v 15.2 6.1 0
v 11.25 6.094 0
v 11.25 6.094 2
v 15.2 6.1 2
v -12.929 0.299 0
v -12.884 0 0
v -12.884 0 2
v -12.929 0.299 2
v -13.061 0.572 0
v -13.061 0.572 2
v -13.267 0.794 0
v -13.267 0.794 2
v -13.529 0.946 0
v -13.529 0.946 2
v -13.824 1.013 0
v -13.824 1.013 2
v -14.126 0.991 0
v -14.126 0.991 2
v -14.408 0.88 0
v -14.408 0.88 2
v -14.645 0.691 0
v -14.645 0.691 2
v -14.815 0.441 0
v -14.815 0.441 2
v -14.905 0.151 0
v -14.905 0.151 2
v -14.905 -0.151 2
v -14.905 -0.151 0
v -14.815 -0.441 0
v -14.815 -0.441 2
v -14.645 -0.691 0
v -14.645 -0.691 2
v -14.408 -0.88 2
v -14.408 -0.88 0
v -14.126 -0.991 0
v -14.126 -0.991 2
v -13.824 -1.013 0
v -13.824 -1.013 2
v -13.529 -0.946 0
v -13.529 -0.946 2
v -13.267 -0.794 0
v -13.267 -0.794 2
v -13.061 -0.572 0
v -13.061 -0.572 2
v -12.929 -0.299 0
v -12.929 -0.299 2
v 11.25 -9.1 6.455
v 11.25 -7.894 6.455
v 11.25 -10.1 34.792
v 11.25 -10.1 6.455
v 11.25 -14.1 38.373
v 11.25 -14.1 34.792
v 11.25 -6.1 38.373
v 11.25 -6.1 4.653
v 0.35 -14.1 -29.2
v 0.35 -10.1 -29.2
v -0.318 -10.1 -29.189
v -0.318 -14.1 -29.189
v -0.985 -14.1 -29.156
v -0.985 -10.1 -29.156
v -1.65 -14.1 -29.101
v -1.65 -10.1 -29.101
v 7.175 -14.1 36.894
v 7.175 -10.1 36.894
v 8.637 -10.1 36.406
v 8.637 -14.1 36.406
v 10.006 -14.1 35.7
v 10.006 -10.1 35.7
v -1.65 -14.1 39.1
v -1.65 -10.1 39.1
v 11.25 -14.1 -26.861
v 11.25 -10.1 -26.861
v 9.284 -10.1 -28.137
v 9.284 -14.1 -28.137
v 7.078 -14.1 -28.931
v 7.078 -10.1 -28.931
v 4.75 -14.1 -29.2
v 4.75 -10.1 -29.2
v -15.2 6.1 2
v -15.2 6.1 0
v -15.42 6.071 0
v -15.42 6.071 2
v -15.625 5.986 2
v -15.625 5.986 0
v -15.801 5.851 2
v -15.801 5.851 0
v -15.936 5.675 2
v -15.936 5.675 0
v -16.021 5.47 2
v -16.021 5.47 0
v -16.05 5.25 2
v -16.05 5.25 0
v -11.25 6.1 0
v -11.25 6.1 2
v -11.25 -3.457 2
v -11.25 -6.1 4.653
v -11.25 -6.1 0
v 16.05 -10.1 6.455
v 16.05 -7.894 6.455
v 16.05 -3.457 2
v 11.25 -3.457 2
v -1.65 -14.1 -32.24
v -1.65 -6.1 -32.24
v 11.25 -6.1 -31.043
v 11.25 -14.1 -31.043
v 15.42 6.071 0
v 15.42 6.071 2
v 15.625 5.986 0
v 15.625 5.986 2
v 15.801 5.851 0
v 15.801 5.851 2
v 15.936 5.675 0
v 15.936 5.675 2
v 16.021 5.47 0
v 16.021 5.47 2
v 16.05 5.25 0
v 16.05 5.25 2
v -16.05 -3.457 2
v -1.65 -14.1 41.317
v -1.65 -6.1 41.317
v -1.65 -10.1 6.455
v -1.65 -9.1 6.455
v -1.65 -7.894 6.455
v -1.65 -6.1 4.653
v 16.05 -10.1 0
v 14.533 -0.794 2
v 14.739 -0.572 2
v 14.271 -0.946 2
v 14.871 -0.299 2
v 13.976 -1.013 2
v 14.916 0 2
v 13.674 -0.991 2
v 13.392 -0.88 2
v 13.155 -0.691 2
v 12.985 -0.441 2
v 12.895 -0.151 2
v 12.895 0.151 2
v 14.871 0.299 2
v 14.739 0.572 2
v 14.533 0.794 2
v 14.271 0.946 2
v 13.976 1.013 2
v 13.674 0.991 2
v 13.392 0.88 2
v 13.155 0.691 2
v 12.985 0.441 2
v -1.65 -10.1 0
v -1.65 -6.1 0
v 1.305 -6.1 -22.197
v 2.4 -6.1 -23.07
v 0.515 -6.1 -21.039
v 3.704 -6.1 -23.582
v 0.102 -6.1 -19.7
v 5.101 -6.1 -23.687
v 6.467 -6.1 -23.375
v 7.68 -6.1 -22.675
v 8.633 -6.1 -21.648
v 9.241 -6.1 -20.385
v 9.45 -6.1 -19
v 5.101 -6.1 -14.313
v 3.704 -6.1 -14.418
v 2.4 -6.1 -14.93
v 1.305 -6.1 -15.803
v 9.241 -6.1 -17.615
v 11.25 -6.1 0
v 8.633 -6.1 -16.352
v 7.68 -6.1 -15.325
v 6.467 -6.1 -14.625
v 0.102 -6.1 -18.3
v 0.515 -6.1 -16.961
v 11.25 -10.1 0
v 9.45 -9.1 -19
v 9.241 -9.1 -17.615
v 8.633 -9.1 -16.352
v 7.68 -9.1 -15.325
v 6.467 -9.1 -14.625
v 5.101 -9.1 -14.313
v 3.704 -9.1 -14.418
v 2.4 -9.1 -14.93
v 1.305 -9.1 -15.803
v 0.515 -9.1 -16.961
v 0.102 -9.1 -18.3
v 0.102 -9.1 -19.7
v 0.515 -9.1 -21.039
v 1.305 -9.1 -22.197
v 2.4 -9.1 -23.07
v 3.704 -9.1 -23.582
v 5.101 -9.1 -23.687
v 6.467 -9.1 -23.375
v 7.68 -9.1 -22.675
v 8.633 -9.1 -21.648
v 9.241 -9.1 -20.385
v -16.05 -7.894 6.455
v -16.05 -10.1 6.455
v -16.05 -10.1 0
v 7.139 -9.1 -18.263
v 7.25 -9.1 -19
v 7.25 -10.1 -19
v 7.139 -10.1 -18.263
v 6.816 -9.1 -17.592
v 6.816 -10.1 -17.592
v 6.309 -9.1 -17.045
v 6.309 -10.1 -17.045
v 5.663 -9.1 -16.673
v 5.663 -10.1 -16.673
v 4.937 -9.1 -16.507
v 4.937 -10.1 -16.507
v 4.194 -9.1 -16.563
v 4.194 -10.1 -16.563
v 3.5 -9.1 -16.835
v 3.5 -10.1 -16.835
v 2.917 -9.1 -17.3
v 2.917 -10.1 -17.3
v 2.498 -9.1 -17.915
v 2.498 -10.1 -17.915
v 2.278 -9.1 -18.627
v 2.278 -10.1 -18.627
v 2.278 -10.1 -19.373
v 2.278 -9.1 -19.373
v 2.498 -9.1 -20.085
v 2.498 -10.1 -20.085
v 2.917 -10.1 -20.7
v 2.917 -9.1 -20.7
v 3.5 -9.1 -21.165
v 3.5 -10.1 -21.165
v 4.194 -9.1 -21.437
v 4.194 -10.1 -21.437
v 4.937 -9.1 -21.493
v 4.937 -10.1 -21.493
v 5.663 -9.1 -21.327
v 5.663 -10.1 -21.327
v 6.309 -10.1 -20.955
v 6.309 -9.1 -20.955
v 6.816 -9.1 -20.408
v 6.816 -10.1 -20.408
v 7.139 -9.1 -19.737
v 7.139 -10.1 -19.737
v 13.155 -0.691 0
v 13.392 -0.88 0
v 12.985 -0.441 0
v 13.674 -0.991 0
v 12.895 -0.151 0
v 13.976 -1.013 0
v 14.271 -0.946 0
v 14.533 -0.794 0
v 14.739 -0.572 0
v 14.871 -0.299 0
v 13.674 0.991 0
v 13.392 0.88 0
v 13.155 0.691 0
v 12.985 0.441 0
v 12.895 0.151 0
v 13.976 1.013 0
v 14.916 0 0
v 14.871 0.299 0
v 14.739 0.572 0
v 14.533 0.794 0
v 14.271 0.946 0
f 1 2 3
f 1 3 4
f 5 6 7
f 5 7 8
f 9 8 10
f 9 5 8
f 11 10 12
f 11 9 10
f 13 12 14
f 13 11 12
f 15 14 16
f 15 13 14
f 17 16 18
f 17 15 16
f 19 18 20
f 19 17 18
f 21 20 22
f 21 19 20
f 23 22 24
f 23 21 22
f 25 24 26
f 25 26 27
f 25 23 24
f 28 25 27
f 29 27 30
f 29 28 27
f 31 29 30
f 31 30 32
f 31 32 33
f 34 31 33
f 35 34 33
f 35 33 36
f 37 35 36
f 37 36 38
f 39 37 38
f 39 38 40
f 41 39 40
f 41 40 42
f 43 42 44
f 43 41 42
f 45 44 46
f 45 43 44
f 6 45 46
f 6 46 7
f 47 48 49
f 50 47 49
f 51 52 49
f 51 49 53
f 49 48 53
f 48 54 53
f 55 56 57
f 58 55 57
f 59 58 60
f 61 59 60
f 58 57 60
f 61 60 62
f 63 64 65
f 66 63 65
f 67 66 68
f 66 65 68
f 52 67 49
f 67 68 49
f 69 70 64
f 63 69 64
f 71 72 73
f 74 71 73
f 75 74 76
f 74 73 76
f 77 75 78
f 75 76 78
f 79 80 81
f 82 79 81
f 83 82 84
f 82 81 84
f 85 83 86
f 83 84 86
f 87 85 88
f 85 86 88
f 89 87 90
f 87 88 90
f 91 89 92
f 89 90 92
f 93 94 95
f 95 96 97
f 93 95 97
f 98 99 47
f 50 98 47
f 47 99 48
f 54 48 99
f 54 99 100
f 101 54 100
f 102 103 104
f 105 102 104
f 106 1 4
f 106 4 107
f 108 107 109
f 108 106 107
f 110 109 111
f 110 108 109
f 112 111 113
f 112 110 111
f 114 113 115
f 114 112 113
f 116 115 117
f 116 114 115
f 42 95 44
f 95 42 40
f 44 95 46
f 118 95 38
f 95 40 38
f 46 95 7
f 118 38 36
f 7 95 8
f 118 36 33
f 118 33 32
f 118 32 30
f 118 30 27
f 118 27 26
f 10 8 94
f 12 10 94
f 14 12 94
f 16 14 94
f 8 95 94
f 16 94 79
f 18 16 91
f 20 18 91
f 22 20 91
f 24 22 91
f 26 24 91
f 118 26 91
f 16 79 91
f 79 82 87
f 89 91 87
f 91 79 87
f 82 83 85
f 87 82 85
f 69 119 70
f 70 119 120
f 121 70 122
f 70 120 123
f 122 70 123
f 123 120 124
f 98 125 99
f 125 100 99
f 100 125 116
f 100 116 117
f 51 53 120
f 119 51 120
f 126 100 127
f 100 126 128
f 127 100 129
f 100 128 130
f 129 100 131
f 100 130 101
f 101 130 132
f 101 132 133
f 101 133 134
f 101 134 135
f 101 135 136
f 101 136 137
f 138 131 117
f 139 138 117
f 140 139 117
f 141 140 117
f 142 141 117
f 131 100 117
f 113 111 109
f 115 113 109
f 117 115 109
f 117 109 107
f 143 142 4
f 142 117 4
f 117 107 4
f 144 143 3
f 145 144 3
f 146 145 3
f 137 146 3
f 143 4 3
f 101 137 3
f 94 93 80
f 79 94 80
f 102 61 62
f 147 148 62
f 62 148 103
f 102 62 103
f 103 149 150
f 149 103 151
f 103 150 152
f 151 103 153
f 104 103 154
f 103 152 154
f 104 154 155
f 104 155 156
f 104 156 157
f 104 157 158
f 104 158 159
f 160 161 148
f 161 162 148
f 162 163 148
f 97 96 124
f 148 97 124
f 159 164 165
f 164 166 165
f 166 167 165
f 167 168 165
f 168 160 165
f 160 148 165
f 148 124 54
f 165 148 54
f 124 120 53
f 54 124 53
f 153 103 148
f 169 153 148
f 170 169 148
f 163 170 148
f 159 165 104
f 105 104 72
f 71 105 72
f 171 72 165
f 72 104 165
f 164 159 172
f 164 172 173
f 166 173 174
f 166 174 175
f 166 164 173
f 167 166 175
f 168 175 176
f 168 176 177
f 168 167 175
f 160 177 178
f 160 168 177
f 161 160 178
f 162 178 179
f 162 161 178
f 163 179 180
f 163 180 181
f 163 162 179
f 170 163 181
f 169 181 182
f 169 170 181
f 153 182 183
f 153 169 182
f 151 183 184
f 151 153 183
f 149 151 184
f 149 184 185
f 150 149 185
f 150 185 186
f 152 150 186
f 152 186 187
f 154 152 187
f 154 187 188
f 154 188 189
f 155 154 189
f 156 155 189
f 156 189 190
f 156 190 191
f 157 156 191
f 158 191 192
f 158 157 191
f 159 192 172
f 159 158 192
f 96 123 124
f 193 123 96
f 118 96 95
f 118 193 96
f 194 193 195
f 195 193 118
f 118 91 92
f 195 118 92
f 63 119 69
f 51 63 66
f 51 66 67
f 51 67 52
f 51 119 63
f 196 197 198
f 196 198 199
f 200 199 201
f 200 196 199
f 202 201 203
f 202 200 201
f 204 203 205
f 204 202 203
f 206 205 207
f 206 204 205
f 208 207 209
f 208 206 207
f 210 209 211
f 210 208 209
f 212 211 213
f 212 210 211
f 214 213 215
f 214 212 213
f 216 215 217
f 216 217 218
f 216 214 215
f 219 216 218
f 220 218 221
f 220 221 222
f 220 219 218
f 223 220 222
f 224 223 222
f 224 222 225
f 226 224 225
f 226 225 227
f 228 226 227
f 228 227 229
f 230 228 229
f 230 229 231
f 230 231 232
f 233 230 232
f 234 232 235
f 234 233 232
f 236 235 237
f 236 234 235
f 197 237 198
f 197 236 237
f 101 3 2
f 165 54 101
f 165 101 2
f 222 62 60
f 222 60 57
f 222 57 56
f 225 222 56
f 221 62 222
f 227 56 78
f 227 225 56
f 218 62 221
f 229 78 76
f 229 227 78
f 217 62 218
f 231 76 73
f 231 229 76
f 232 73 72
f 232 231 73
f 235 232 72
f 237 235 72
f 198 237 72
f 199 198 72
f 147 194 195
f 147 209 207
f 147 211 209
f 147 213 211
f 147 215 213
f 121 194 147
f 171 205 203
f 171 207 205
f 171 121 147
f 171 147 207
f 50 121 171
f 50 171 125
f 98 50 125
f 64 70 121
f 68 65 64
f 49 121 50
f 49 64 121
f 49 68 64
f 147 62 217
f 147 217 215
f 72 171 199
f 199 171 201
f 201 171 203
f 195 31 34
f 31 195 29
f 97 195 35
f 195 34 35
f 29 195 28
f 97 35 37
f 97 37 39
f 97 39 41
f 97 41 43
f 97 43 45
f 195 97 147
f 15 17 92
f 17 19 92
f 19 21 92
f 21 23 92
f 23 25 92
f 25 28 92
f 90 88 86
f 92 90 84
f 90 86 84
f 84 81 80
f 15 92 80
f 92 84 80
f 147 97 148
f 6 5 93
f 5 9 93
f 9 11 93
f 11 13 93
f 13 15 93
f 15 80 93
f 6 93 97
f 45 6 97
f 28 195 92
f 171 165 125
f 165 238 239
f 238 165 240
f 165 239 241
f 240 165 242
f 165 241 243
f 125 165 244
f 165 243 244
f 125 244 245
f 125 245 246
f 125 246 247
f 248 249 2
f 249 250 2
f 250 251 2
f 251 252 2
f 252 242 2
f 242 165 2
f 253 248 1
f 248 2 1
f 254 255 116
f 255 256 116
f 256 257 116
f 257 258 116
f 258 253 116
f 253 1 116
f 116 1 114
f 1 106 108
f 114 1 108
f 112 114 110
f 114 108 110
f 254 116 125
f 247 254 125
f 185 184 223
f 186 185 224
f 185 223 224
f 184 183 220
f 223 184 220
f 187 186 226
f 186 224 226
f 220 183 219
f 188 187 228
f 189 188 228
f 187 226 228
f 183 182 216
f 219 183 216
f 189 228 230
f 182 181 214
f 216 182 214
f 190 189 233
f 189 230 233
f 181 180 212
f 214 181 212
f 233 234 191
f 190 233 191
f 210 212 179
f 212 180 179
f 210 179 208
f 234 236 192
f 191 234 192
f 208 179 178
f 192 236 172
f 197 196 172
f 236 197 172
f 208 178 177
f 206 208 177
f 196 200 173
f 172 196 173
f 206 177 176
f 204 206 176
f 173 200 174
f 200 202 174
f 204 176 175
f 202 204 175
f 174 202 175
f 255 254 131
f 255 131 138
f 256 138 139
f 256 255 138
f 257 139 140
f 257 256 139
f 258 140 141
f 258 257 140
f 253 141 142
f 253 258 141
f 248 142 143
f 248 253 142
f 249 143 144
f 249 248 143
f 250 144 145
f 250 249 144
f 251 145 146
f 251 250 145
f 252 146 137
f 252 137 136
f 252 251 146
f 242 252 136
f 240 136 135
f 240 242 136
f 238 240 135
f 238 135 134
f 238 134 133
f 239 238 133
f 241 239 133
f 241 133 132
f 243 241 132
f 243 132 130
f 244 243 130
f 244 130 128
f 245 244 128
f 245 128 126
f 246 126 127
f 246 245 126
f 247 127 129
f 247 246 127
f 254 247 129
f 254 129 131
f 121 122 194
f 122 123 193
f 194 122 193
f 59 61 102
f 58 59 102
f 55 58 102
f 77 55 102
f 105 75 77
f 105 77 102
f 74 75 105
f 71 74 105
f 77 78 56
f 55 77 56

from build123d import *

# Parameters (mm, degrees)
SKETCH1_R                       = 1.016
BOSS_EXTRUDE1_DEPTH             = 2
SKETCH2_R                       = 4.7
BOSS_EXTRUDE2_DEPTH             = 3
BOSS_EXTRUDE5_DEPTH             = 8
BOSS_EXTRUDE6_REACH             = 53.49
BOSS_EXTRUDE6_DIRECTION_2_REACH = 53.49
SKETCH4_W                       = 22.5
SKETCH4_H                       = 14.127681706
CUT_EXTRUDE1_DEPTH              = 7
FILLET1_R                       = 0.5
SKETCH5_R                       = 2.5
BOSS_EXTRUDE7_DEPTH             = 1
SKETCH6_W                       = 5.313656685
SKETCH6_H                       = 4.599259183
SKETCH6_W_2                     = 16.163165117
SKETCH6_H_2                     = 5.344557169
CUT_EXTRUDE2_DEPTH              = 5


with BuildPart() as part:
    # Sketch1 → Boss-Extrude1 (new body)
    # profile 1 of 4: a face of its own
    with BuildSketch(Plane.XY):
        with BuildLine():
            Line((-16.05, 5.25), (-16.05, -5.25))
            ThreePointArc((-16.05, -5.25), (-15.801040764, -5.851040764), (-15.2, -6.1))
            Line((-15.2, -6.1), (-11.25, -6.1))
            Line((-11.25, -6.1), (-11.25, 6.1))
            Line((-11.25, 6.1), (-15.2, 6.1))
            ThreePointArc((-15.2, 6.1), (-15.801040764, 5.851040764), (-16.05, 5.25))
        make_face()
        with Locations((-13.9, 0)):
            Circle(SKETCH1_R, mode=Mode.SUBTRACT)
    # profile 2 of 4: a face of its own
    with BuildSketch(Plane.XY):
        with BuildLine():
            Line((16.05, 5.25), (16.05, -5.25))
            ThreePointArc((16.05, -5.25), (15.801040764, -5.851040764), (15.2, -6.1))
            Line((15.2, -6.1), (11.25, -6.1))
            Line((11.25, -6.1), (11.25, 6.094097151))
            Line((11.25, 6.094097151), (15.2, 6.1))
            ThreePointArc((15.2, 6.1), (15.801040764, 5.851040764), (16.05, 5.25))
        make_face()
        with Locations((13.9, 0)):
            Circle(SKETCH1_R, mode=Mode.SUBTRACT)
    # profile 3 of 4: a face of its own
    with BuildSketch(Plane.XY):
        with BuildLine():
            ThreePointArc((15.2, -6.1), (15.801040764, -5.851040764), (16.05, -5.25))
            Line((16.05, -5.25), (16.05, -6.1))
            Line((16.05, -6.1), (15.2, -6.1))
        make_face()
    # profile 4 of 4: a face of its own
    with BuildSketch(Plane.XY):
        with BuildLine():
            ThreePointArc((-16.05, -5.25), (-15.801040764, -5.851040764), (-15.2, -6.1))
            Line((-15.2, -6.1), (-16.05, -6.1))
            Line((-16.05, -6.1), (-16.05, -5.25))
        make_face()
    extrude(amount=BOSS_EXTRUDE1_DEPTH)

    # Sketch2 → Boss-Extrude2 (add)
    with BuildSketch(Plane.XZ.offset(6.1)):
        Polygon((16.05, 2), (11.25, 2), (11.25, 38.372960525), (-1.65, 41.317302208), (-1.65, 22.612965014), (-1.65, 2), (-16.05, 2), (-16.05, 0), (-1.65, 0), (-1.65, -32.240273927), (11.25, -31.043279545), (11.25, 0), (16.05, 0), align=None)
        with Locations((4.75, -19)):
            Circle(SKETCH2_R, mode=Mode.SUBTRACT)
    extrude(amount=BOSS_EXTRUDE2_DEPTH)

    # Sketch2<3> → Boss-Extrude5 (add)
    with BuildSketch(Plane.XZ.offset(6.1)):
        with BuildLine():
            ThreePointArc((7.17535625, 36.893660937), (9.334777443, 36.079294831), (11.25, 34.791578013))
            Line((11.25, 34.791578013), (11.25, 38.372960525))
            Line((11.25, 38.372960525), (-1.65, 41.317302208))
            Line((-1.65, 41.317302208), (-1.65, 39.1))
            Line((-1.65, 39.1), (7.17535625, 36.893660937))
        make_face()
        with BuildLine():
            ThreePointArc((0.350023778, -29.2), (-0.651218811, -29.175170712), (-1.65, -29.100743889))
            Line((-1.65, -29.100743889), (-1.65, -32.240273927))
            Line((-1.65, -32.240273927), (11.25, -31.043279545))
            Line((11.25, -31.043279545), (11.25, -26.86066155))
            ThreePointArc((11.25, -26.86066155), (8.204073841, -28.597362862), (4.75, -29.2))
            Line((4.75, -29.2), (0.350023778, -29.2))
        make_face()
    extrude(amount=BOSS_EXTRUDE5_DEPTH)

    # Boss-Extrude6: up to this face of the body (flat: up to its plane)
    boss_extrude6_end = Plane(part.part.faces().sort_by_distance((16.05, -1.925, 1))[0])
    # Sketch3 → Boss-Extrude6 (add, up to the picked face)
    with BuildSketch(Plane(origin=(11.25, 0, 0), x_dir=(0, 0, -1), z_dir=(1, 0, 0)), mode=Mode.PRIVATE) as boss_extrude6_sk1:
        Polygon((-7.665828596, -9.1), (-2, -3.457464127), (-2, -9.1), align=None)
    boss_extrude6_tool1 = split(extrude(boss_extrude6_sk1.sketch, amount=BOSS_EXTRUDE6_REACH, mode=Mode.PRIVATE), bisect_by=boss_extrude6_end, keep=Keep.BOTH, mode=Mode.PRIVATE)
    add(boss_extrude6_tool1.solids().sort_by(Axis((11.25, -7.219155, 3.88861), (1, 0, 0)))[0])

    # Boss-Extrude6 direction 2: up to this face of the body (flat: up to its plane)
    boss_extrude6_direction_2_end = Plane(part.part.faces().sort_by_distance((-16.05, -1.925, 1))[0])
    # Sketch3 → Boss-Extrude6 direction 2 (add, up to the picked face)
    with BuildSketch(Plane(origin=(11.25, 0, 0), x_dir=(0, 0, -1), z_dir=(1, 0, 0)), mode=Mode.PRIVATE) as boss_extrude6_direction_2_sk1:
        Polygon((-7.665828596, -9.1), (-2, -3.457464127), (-2, -9.1), align=None)
    boss_extrude6_direction_2_tool1 = split(extrude(boss_extrude6_direction_2_sk1.sketch, amount=-BOSS_EXTRUDE6_DIRECTION_2_REACH, mode=Mode.PRIVATE), bisect_by=boss_extrude6_direction_2_end, keep=Keep.BOTH, mode=Mode.PRIVATE)
    add(boss_extrude6_direction_2_tool1.solids().sort_by(Axis((11.25, -7.219155, 3.88861), (-1, 0, 0)))[0])

    # Sketch4 → Cut-Extrude1 (cut)
    with BuildSketch(Plane(origin=(0, -6.1, 0), x_dir=(1, 0, 0), z_dir=(0, 1, 0))):
        with Locations((0, -7.063840853)):
            Rectangle(SKETCH4_W, SKETCH4_H)
    extrude(amount=CUT_EXTRUDE1_DEPTH, mode=Mode.SUBTRACT)

    # Fillet1
    fillet1_edges = [part.edges().sort_by_distance(p)[0] for p in [
        (13.65, -9.1, 7.665828596),
        (-8.85, -9.1, 7.665828596),
    ]]
    fillet(fillet1_edges, radius=FILLET1_R)

    # Sketch5 → Boss-Extrude7 (add)
    with BuildSketch(Plane.XZ.offset(9.1)):
        with BuildLine():
            Line((-1.65, 39.1), (-1.65, 6.455196792))
            Line((-1.65, 6.455196792), (-16.05, 6.455196792))
            Line((-16.05, 6.455196792), (-16.05, 0))
            Line((-16.05, 0), (-1.65, 0))
            Line((-1.65, 0), (-1.65, -29.100743889))
            ThreePointArc((-1.65, -29.100743889), (-0.651218811, -29.175170712), (0.350023778, -29.2))
            Line((0.350023778, -29.2), (4.75, -29.2))
            ThreePointArc((4.75, -29.2), (8.204073841, -28.597362862), (11.25, -26.86066155))
            Line((11.25, -26.86066155), (11.25, 0))
            Line((11.25, 0), (16.05, 0))
            Line((16.05, 0), (16.05, 6.455196792))
            Line((16.05, 6.455196792), (11.25, 6.455196792))
            Line((11.25, 6.455196792), (11.25, 34.791578013))
            ThreePointArc((11.25, 34.791578013), (9.334777443, 36.079294831), (7.17535625, 36.893660937))
            Line((7.17535625, 36.893660937), (-1.65, 39.1))
        make_face()
        with Locations((4.75, -19)):
            Circle(SKETCH5_R, mode=Mode.SUBTRACT)
    extrude(amount=BOSS_EXTRUDE7_DEPTH)

    # Sketch6 → Cut-Extrude2 (cut)
    with BuildSketch(Plane.XY.offset(6.455196792)):
        with Locations((13.906828343, -7.800370409)):
            Rectangle(SKETCH6_W, SKETCH6_H)
        with Locations((-9.731582558, -7.427721416)):
            Rectangle(SKETCH6_W_2, SKETCH6_H_2)
    extrude(amount=CUT_EXTRUDE2_DEPTH, mode=Mode.SUBTRACT)


solid = part.part
